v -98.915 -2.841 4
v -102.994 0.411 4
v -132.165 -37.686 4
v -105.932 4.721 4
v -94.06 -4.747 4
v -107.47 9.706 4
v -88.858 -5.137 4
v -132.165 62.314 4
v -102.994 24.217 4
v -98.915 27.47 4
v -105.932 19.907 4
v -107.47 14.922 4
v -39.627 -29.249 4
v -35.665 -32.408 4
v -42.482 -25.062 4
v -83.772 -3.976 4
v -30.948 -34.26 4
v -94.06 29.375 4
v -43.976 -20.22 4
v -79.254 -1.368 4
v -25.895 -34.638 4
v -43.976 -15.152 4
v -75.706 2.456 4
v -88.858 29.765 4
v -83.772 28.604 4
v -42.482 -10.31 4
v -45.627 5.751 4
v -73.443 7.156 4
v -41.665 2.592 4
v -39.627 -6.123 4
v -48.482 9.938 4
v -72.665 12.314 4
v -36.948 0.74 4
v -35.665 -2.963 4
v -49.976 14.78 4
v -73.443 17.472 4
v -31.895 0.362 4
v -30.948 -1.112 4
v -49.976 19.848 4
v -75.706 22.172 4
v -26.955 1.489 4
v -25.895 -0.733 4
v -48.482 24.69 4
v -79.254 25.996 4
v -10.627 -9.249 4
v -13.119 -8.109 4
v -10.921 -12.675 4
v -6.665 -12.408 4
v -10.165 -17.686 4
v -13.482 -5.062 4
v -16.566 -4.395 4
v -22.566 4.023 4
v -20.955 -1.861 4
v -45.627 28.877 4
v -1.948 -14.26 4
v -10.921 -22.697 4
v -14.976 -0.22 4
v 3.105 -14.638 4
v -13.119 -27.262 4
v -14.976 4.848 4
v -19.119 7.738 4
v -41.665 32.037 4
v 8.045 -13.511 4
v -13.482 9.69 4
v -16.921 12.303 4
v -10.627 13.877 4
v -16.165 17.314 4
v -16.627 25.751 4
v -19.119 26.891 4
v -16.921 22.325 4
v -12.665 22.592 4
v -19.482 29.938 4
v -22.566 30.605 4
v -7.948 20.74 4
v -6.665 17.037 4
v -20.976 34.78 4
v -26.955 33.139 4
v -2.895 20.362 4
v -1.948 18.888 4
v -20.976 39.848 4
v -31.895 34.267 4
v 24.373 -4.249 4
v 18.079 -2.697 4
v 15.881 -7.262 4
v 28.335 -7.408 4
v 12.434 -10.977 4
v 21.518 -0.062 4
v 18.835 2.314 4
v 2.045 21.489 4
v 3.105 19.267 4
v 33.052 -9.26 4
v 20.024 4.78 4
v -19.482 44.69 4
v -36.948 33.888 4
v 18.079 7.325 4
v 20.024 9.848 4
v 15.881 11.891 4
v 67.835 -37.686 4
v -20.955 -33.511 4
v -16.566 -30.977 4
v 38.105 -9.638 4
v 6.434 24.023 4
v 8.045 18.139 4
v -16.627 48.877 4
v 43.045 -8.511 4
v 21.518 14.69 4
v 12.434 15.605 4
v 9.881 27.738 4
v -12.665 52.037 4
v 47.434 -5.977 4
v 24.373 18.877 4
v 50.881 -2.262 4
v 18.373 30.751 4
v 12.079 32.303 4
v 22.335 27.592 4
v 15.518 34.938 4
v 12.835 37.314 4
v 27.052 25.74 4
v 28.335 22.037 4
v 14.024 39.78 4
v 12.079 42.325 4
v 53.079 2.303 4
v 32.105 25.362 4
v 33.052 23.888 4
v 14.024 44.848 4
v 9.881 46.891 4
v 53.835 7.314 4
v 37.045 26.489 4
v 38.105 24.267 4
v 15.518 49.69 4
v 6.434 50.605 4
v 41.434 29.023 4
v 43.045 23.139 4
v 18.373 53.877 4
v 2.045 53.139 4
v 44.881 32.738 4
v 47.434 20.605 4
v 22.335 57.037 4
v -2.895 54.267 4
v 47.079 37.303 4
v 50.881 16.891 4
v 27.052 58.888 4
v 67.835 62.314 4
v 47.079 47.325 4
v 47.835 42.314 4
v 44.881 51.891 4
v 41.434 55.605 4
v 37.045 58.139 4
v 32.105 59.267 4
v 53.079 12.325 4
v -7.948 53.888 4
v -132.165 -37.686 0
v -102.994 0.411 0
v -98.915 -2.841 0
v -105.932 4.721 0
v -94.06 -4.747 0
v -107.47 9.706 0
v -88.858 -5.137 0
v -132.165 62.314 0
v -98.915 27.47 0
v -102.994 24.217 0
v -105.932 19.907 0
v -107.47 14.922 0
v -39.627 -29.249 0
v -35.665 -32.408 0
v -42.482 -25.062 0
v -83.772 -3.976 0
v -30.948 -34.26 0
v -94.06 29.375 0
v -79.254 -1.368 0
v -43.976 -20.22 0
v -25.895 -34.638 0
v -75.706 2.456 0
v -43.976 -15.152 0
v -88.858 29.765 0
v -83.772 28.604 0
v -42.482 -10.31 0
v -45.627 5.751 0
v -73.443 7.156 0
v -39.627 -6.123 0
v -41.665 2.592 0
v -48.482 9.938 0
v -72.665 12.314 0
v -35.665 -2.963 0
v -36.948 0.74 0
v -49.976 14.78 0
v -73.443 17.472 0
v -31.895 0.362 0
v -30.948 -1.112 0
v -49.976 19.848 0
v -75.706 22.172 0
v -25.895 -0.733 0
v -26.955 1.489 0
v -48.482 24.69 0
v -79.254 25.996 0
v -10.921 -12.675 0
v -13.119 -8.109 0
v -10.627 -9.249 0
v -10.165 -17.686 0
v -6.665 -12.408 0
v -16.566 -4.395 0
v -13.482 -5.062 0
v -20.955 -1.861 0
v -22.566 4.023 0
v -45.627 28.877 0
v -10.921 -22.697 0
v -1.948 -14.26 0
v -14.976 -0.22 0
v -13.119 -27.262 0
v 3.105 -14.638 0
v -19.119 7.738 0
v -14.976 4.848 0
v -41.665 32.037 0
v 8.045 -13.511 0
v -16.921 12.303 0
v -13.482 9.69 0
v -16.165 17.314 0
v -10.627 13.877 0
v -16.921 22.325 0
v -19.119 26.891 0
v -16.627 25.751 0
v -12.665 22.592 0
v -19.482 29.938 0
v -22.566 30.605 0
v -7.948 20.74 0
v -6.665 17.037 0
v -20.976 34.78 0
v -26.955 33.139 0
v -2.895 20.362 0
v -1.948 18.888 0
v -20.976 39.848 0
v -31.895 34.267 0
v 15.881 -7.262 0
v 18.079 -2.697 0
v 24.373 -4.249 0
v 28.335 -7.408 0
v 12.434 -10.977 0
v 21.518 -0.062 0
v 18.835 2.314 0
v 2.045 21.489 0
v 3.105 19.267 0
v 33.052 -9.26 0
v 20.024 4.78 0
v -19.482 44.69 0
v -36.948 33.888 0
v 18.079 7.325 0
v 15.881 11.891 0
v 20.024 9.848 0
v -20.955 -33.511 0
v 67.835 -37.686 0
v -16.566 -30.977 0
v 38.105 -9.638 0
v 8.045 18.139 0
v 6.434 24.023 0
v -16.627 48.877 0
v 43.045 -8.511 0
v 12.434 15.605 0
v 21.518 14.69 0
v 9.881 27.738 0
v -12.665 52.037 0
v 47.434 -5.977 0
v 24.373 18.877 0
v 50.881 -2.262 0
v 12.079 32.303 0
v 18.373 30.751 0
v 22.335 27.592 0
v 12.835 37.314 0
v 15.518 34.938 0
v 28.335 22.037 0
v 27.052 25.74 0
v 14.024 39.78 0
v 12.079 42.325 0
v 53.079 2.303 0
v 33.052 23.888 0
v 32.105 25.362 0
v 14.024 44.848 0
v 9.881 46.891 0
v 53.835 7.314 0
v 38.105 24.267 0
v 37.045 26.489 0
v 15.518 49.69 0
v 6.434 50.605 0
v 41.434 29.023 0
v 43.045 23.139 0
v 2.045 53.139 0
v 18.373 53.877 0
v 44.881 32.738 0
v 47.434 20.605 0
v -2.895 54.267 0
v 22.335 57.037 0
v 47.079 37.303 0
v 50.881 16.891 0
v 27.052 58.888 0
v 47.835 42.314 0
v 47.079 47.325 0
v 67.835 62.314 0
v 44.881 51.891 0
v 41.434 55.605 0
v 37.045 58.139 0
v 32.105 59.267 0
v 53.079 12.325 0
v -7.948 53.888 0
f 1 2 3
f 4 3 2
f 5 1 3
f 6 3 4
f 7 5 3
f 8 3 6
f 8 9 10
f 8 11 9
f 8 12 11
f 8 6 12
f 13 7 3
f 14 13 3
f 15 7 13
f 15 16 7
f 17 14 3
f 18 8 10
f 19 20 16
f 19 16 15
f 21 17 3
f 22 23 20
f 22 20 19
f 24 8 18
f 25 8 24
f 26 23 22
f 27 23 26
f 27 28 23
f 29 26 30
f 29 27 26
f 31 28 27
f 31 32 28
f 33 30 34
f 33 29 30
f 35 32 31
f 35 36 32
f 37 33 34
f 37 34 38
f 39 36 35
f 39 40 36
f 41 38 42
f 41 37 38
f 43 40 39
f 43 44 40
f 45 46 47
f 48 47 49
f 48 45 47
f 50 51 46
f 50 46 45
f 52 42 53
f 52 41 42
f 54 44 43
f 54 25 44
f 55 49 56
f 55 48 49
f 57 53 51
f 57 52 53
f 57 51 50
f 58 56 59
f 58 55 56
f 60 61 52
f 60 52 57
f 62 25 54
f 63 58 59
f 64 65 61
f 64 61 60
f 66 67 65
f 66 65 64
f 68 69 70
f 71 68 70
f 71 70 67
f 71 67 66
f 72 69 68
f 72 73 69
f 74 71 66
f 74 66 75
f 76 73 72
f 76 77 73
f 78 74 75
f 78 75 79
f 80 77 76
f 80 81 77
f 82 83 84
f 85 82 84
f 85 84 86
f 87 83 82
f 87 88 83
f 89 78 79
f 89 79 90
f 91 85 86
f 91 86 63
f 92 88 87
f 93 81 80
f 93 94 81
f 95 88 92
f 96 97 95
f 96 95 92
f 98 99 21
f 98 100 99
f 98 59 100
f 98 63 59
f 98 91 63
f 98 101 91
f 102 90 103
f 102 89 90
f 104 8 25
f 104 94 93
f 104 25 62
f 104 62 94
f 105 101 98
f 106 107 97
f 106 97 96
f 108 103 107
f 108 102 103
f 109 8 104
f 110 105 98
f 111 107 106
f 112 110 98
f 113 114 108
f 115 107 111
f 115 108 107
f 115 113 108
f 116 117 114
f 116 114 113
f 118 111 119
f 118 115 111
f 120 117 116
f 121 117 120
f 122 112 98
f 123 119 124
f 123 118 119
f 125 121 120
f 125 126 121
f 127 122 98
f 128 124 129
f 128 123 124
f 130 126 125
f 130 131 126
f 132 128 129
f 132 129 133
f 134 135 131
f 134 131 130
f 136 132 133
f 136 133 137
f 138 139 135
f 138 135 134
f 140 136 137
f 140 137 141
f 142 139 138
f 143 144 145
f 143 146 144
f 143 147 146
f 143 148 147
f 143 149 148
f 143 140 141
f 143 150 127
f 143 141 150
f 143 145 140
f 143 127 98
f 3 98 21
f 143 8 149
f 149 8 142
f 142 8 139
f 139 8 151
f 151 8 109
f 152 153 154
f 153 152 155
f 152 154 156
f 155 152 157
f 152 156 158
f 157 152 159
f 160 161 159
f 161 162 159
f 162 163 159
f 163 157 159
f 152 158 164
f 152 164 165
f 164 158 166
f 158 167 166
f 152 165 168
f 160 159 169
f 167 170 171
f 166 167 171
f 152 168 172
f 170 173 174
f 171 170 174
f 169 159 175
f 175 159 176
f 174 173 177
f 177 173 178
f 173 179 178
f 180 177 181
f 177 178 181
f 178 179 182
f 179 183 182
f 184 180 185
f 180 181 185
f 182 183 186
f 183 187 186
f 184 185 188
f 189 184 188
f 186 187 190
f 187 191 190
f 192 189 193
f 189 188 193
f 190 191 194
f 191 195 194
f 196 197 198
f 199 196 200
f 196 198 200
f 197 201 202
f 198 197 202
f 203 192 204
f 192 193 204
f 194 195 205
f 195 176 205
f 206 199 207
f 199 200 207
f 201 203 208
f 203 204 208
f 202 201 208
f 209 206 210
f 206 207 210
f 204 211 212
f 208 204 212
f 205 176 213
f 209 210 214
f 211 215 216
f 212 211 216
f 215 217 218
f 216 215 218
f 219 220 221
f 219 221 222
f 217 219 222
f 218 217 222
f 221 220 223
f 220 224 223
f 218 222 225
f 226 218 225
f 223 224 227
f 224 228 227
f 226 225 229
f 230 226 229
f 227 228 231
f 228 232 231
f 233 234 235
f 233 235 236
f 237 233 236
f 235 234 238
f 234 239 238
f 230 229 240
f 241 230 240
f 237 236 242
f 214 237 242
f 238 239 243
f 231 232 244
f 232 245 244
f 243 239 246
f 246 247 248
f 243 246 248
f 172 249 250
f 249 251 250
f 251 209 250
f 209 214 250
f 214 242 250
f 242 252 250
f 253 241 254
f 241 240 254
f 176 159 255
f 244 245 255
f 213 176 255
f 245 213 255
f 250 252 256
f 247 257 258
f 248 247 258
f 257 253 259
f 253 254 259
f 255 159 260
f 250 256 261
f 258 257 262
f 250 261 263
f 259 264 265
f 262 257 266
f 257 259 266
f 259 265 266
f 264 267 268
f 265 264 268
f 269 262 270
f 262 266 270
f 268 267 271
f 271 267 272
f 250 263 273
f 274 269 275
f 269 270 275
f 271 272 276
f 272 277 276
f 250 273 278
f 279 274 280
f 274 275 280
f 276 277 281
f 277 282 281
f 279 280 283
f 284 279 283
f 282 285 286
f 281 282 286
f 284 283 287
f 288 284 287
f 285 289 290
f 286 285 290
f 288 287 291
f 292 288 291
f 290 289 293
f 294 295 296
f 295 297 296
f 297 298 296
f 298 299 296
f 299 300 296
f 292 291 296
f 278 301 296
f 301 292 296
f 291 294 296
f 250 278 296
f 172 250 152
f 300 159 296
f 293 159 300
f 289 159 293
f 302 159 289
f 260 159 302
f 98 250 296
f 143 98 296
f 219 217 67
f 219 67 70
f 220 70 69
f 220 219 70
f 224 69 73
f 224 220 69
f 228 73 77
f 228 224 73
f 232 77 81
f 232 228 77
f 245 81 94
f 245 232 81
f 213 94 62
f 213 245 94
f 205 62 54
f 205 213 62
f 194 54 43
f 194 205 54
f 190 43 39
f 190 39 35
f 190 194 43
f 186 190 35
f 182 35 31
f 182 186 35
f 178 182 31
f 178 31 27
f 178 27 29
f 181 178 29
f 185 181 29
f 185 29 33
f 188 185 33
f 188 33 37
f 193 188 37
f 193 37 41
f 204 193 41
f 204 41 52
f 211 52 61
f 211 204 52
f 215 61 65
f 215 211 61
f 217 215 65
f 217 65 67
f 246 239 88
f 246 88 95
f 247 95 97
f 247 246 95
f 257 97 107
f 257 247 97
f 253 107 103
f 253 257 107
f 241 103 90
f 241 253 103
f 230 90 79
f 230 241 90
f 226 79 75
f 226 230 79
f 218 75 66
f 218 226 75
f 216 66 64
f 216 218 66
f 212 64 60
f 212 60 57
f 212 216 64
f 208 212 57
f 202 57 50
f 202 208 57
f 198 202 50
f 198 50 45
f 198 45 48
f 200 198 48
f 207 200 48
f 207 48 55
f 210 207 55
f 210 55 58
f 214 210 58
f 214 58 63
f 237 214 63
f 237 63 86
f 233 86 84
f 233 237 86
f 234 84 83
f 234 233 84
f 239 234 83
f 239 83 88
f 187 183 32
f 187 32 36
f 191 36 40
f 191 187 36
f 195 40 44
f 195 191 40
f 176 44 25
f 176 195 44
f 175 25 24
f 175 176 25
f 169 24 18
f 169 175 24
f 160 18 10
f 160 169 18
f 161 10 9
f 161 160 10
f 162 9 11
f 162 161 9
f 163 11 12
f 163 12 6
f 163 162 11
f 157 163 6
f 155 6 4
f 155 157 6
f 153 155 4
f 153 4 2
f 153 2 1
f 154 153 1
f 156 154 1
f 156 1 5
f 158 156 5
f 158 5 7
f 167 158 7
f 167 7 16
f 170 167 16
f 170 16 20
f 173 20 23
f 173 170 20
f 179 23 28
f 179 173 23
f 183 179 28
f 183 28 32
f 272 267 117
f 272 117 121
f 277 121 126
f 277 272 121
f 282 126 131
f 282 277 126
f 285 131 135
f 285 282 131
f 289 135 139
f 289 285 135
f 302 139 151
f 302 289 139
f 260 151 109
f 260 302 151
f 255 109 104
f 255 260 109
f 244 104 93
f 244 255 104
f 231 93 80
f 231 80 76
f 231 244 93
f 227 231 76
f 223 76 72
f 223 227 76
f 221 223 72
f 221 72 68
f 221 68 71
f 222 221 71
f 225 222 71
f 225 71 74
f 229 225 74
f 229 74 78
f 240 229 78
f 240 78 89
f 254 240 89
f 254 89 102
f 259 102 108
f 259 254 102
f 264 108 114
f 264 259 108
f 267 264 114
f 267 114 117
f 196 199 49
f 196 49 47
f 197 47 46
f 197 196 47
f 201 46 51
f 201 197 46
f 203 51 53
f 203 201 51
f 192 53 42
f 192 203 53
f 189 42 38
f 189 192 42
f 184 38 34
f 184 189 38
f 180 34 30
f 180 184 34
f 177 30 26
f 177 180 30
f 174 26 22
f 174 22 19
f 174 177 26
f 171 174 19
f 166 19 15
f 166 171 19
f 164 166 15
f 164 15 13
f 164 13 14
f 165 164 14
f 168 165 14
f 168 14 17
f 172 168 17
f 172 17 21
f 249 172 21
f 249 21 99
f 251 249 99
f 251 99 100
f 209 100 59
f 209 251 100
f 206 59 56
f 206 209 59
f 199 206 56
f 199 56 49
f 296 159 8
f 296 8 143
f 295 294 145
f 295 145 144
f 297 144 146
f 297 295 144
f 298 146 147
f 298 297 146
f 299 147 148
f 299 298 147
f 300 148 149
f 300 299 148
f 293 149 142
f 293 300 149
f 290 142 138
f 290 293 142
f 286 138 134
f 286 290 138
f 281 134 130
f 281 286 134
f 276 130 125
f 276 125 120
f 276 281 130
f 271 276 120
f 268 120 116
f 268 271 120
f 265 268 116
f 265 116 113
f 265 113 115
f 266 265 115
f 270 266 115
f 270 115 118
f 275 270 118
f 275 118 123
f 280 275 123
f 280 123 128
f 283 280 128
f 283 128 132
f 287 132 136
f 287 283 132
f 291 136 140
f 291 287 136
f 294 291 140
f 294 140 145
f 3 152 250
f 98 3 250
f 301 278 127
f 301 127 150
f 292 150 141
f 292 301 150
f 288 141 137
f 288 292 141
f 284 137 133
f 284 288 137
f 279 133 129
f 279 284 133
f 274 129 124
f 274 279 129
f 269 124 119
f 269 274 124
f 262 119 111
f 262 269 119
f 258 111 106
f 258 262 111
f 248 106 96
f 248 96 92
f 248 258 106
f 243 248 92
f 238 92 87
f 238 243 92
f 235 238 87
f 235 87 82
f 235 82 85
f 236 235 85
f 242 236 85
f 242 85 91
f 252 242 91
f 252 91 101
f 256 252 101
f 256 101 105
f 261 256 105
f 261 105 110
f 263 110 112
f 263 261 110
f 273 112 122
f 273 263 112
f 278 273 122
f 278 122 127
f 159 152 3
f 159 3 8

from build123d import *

# Parameters (mm, degrees)
F0_W     = 200
F0_H     = 100
F2_DEPTH = 4
F1_R     = 17.5
F1_R_2   = 17
F3_DEPTH = 4


with BuildPart() as f2:
    # F0 (on Top) → F2 (new body)
    with BuildSketch(Plane.XY):
        with Locations((-32.165436, 12.314129)):
            Rectangle(F0_W, F0_H)
    extrude(amount=F2_DEPTH)

    # F1 (on face) → F3 (cut)
    with BuildSketch(Plane.XY):
        with Locations((-90.165436, 12.314129)):
            Circle(F1_R)
        with Locations((-27.165436, -17.685871)):
            Circle(F1_R_2)
        with Locations((-33.165436, 17.314129)):
            Circle(F1_R_2)
        with Locations((1.834564, 2.314129)):
            Circle(F1_R_2)
        with Locations((-4.165436, 37.314129)):
            Circle(F1_R_2)
        with Locations((36.834564, 7.314129)):
            Circle(F1_R_2)
        with Locations((30.834564, 42.314129)):
            Circle(F1_R_2)
    extrude(amount=F3_DEPTH, mode=Mode.SUBTRACT)


solid = f2.part
